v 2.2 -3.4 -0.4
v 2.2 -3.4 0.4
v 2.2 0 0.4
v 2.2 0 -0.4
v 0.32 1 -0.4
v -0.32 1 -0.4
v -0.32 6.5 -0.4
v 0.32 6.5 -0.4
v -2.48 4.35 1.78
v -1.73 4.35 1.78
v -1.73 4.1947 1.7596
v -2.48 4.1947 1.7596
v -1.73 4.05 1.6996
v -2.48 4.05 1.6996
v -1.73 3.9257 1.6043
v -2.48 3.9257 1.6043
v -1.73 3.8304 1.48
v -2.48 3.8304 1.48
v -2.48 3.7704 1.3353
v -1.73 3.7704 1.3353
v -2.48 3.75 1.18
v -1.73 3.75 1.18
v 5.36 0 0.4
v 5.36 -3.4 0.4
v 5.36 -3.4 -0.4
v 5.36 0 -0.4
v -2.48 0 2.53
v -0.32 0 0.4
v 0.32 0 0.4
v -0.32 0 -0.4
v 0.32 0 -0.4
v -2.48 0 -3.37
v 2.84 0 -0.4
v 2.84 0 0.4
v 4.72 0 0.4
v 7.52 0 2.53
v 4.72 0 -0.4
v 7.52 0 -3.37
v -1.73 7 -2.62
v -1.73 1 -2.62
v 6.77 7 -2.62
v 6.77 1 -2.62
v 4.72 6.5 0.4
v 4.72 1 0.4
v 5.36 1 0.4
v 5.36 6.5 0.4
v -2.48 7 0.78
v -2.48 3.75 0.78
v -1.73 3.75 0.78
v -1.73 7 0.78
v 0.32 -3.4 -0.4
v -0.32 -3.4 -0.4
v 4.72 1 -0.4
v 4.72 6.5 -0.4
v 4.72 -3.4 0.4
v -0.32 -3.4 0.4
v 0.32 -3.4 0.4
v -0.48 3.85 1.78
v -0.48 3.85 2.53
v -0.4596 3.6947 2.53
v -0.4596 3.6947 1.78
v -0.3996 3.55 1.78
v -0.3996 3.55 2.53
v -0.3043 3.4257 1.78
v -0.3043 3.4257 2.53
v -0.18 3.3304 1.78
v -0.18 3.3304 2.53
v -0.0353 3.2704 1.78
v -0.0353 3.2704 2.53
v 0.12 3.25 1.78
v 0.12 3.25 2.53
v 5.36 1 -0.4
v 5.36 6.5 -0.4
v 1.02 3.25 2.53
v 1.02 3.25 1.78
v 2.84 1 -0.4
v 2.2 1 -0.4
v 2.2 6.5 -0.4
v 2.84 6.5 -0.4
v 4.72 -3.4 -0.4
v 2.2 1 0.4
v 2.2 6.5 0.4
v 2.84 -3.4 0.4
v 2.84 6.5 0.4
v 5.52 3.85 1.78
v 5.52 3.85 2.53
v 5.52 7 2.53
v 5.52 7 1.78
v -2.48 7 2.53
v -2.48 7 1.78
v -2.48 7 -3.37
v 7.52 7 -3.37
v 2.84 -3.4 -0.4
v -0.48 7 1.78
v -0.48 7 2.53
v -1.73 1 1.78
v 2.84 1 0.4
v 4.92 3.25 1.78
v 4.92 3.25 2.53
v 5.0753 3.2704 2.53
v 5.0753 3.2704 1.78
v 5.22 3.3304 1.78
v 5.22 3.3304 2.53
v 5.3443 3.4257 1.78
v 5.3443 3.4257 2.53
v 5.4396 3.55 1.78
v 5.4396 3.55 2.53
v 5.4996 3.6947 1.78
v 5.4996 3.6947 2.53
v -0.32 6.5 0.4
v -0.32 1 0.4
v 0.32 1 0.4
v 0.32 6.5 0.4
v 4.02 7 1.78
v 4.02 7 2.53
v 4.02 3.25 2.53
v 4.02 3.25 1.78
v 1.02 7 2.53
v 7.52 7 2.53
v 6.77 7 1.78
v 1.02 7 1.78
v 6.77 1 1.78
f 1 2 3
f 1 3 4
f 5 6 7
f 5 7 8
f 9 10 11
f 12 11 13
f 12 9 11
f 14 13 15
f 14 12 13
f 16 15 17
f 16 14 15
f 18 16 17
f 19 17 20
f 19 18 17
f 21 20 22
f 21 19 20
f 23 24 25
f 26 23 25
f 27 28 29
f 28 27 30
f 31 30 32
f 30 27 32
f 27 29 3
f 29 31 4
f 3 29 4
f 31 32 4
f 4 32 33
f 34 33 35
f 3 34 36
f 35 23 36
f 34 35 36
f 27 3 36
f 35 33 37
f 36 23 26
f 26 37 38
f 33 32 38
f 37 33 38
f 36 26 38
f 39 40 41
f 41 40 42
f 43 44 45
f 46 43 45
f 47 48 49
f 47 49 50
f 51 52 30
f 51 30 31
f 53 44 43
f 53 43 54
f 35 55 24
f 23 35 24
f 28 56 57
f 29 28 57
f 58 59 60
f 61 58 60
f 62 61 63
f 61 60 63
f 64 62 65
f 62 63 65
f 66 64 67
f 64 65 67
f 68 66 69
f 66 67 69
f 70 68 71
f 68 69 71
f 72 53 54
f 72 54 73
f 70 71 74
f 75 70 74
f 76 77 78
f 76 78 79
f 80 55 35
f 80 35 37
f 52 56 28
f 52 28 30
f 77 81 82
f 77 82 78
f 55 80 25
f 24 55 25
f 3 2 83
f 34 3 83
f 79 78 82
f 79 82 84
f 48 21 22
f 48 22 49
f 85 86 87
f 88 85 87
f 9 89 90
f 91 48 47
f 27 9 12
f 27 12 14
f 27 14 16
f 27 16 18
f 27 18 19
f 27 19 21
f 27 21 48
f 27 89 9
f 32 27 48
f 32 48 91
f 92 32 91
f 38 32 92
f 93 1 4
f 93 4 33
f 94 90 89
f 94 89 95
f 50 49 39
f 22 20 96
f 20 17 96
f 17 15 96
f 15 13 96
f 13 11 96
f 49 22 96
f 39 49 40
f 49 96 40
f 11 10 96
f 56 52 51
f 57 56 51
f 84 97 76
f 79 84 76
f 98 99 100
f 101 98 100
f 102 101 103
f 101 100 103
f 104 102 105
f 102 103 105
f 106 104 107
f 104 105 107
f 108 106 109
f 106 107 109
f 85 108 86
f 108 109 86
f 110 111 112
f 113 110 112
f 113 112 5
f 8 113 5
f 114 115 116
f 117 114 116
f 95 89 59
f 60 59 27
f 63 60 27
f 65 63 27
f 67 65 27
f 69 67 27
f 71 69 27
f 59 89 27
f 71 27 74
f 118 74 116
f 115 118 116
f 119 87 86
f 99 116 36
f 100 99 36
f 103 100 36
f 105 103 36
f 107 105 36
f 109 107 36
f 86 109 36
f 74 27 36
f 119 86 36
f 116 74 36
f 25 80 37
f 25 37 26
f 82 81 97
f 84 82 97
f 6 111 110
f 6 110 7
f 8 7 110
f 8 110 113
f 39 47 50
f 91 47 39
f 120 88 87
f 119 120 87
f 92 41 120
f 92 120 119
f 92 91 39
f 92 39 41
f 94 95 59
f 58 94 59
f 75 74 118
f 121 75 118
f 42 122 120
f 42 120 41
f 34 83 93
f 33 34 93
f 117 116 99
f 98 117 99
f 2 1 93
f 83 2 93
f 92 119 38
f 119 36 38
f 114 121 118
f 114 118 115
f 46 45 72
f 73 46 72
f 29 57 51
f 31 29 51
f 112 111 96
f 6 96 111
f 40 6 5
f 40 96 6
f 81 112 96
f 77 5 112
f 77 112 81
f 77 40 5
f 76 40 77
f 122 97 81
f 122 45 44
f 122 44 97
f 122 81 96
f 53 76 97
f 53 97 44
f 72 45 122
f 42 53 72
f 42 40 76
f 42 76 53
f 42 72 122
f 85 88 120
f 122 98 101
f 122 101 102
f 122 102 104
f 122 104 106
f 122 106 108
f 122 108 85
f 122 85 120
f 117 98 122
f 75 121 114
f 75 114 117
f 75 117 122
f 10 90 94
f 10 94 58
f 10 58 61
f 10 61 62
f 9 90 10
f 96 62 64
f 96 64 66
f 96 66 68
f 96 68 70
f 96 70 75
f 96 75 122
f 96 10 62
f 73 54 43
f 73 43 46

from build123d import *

# Parameters (mm, degrees)
CROQUIS1_W                   = 10
CROQUIS1_H                   = 5.9
CROQUIS1_W_2                 = 0.64
CROQUIS1_H_2                 = 0.8
SALIENTE_EXTRUIR1_DEPTH      = 1
CROQUIS2_W                   = 10
CROQUIS2_H                   = 5.9
CROQUIS2_W_2                 = 8.5
CROQUIS2_H_2                 = 4.4
SALIENTE_EXTRUIR2_DEPTH      = 6
CORTAR_EXTRUIR1_DEPTH        = 9
CORTAR_EXTRUIR2_DEPTH        = 2
SALIENTE_EXTRUIR3_DEPTH      = 6.5
SALIENTE_EXTRUIR3_DEPTH_BACK = 3.4
CROQUIS5_W                   = 0.64
CROQUIS5_H                   = 0.8


with BuildPart() as part:
    # Croquis1 → Saliente-Extruir1 (new body)
    with BuildSketch(Plane(origin=(0, 0, 0), x_dir=(1, 0, 0), z_dir=(0, 1, 0))):
        with Locations((2.52, 0.42)):
            Rectangle(CROQUIS1_W, CROQUIS1_H)
        Rectangle(CROQUIS1_W_2, CROQUIS1_H_2, mode=Mode.SUBTRACT)
        with Locations((5.04, 0)):
            Rectangle(CROQUIS1_W_2, CROQUIS1_H_2, mode=Mode.SUBTRACT)
        with Locations((2.52, 0)):
            Rectangle(CROQUIS1_W_2, CROQUIS1_H_2, mode=Mode.SUBTRACT)
    extrude(amount=SALIENTE_EXTRUIR1_DEPTH)

    # Croquis2 → Saliente-Extruir2 (add)
    with BuildSketch(Plane(origin=(0, 1, 0), x_dir=(1, 0, 0), z_dir=(0, 1, 0))):
        with Locations((2.52, 0.42)):
            Rectangle(CROQUIS2_W, CROQUIS2_H)
        with Locations((2.52, 0.42)):
            Rectangle(CROQUIS2_W_2, CROQUIS2_H_2, mode=Mode.SUBTRACT)
    extrude(amount=SALIENTE_EXTRUIR2_DEPTH)

    # Croquis3 → Cortar-Extruir1 (cut)
    with BuildSketch(Plane.ZY.offset(2.48)):
        with BuildLine():
            Line((1.78, 7), (1.78, 4.35))
            ThreePointArc((1.78, 4.35), (1.604264069, 3.925735931), (1.18, 3.75))
            Line((1.18, 3.75), (0.78, 3.75))
            Line((0.78, 3.75), (0.78, 7))
            Line((0.78, 7), (1.78, 7))
        make_face()
    extrude(amount=-CORTAR_EXTRUIR1_DEPTH, mode=Mode.SUBTRACT)

    # Croquis4 → Cortar-Extruir2 (cut)
    with BuildSketch(Plane.XY.offset(2.53)):
        with BuildLine():
            Line((-0.48, 7), (-0.48, 3.85))
            ThreePointArc((-0.48, 3.85), (-0.304264069, 3.425735931), (0.12, 3.25))
            Line((0.12, 3.25), (1.02, 3.25))
            Line((1.02, 3.25), (1.02, 7))
            Line((1.02, 7), (-0.48, 7))
        make_face()
        with BuildLine():
            Line((5.52, 7), (4.02, 7))
            Line((4.02, 7), (4.02, 3.25))
            Line((4.02, 3.25), (4.92, 3.25))
            ThreePointArc((4.92, 3.25), (5.344264069, 3.425735931), (5.52, 3.85))
            Line((5.52, 3.85), (5.52, 7))
        make_face()
    extrude(amount=-CORTAR_EXTRUIR2_DEPTH, mode=Mode.SUBTRACT)

    # Croquis5 → Saliente-Extruir3 (add, two sides: drawn at the far end of the back side and taken through both)
    with BuildSketch(Plane(origin=(0, 0, 0), x_dir=(1, 0, 0), z_dir=(0, 1, 0)).offset(-SALIENTE_EXTRUIR3_DEPTH_BACK)):
        with Locations((5.04, 0)):
            Rectangle(CROQUIS5_W, CROQUIS5_H)
        Rectangle(CROQUIS5_W, CROQUIS5_H)
        with Locations((2.52, 0)):
            Rectangle(CROQUIS5_W, CROQUIS5_H)
    extrude(amount=SALIENTE_EXTRUIR3_DEPTH + SALIENTE_EXTRUIR3_DEPTH_BACK)


solid = part.part
